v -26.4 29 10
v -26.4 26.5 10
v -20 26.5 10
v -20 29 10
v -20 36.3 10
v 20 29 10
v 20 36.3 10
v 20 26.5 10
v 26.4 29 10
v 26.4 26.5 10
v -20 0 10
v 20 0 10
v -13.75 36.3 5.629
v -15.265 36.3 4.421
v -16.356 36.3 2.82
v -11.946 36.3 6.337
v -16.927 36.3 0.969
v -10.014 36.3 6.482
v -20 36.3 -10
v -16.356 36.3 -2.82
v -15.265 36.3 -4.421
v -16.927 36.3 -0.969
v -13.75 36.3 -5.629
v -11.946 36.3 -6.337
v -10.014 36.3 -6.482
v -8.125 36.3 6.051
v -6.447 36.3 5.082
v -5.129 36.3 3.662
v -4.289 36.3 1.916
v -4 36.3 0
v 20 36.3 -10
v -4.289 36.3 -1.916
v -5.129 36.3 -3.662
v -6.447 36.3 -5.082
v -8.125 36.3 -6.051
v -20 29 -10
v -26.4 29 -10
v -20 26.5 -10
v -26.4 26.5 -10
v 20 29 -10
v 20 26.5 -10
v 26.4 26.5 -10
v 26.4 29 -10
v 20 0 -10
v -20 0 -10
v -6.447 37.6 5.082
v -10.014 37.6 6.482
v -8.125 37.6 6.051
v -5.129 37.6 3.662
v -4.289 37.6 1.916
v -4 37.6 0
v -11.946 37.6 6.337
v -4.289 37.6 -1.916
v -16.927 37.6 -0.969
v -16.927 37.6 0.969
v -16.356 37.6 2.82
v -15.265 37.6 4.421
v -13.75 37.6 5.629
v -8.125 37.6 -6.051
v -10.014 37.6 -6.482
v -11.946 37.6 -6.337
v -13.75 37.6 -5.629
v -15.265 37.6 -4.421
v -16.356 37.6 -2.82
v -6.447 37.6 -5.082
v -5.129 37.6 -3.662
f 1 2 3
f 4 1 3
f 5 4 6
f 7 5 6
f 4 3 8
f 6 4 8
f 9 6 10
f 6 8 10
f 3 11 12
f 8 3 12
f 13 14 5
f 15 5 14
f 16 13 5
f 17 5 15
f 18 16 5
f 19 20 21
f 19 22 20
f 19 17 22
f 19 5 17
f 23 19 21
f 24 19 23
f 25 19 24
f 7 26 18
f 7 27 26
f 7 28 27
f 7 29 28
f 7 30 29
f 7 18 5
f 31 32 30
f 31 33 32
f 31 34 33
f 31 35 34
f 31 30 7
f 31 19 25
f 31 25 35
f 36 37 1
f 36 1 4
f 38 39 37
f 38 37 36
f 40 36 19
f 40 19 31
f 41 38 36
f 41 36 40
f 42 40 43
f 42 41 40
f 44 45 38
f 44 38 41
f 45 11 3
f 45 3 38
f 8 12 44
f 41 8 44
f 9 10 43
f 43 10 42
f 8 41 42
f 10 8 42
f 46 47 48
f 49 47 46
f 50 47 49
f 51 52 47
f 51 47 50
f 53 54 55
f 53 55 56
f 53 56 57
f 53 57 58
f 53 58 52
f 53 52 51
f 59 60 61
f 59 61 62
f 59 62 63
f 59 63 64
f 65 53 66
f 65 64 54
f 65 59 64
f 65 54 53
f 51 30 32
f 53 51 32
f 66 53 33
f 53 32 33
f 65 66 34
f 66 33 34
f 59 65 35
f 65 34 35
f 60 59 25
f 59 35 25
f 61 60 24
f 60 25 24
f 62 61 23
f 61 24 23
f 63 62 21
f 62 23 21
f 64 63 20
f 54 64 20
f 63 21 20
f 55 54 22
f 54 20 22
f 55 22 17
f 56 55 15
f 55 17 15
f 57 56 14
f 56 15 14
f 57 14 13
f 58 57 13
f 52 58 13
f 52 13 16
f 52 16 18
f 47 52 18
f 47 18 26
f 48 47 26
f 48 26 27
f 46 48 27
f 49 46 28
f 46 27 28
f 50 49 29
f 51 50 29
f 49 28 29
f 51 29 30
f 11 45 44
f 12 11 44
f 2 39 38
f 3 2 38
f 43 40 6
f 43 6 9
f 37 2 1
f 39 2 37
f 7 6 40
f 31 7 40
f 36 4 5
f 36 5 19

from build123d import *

# Parameters (mm, degrees)
SKETCH1_W           = 40
SKETCH1_H           = 20
BOSS_EXTRUDE1_DEPTH = 26.5
SKETCH2_W           = 52.8
SKETCH2_H           = 20
BOSS_EXTRUDE2_DEPTH = 2.5
SKETCH3_W           = 40
SKETCH3_H           = 20
BOSS_EXTRUDE3_DEPTH = 7.3
SKETCH4_R           = 6.5
BOSS_EXTRUDE4_DEPTH = 1.3


with BuildPart() as part:
    # Sketch1 → Boss-Extrude1 (new body)
    with BuildSketch(Plane(origin=(0, 0, 0), x_dir=(1, 0, 0), z_dir=(0, 1, 0))):
        Rectangle(SKETCH1_W, SKETCH1_H)
    extrude(amount=BOSS_EXTRUDE1_DEPTH)

    # Sketch2 → Boss-Extrude2 (add)
    with BuildSketch(Plane(origin=(0, 26.5, 0), x_dir=(1, 0, 0), z_dir=(0, 1, 0))):
        Rectangle(SKETCH2_W, SKETCH2_H)
    extrude(amount=BOSS_EXTRUDE2_DEPTH)

    # Sketch3 → Boss-Extrude3 (add)
    with BuildSketch(Plane(origin=(0, 29, 0), x_dir=(1, 0, 0), z_dir=(0, 1, 0))):
        Rectangle(SKETCH3_W, SKETCH3_H)
    extrude(amount=BOSS_EXTRUDE3_DEPTH)

    # Sketch4 → Boss-Extrude4 (add)
    with BuildSketch(Plane(origin=(0, 36.3, 0), x_dir=(1, 0, 0), z_dir=(0, 1, 0))):
        with Locations((-10.5, 0)):
            Circle(SKETCH4_R)
    extrude(amount=BOSS_EXTRUDE4_DEPTH)


solid = part.part
